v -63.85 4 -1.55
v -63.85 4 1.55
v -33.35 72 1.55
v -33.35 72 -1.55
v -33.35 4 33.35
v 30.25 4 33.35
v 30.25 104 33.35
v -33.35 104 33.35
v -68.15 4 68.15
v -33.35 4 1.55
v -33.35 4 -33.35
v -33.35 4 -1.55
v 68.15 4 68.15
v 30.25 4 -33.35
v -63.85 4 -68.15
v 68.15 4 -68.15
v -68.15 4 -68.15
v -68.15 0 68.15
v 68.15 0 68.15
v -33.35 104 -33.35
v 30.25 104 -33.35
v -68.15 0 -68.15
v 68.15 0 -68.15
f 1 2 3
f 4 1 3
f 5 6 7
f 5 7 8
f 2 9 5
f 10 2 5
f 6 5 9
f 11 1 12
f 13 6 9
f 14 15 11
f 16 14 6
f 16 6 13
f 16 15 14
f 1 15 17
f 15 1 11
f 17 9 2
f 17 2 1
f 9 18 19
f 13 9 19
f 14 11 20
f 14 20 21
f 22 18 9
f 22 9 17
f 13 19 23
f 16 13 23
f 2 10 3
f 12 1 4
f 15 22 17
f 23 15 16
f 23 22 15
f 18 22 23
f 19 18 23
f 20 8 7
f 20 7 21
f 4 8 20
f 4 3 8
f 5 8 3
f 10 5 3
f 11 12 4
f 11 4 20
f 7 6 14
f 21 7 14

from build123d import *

# Parameters (mm, degrees)
SKETCH_1_W          = 136.3
SKETCH_1_H          = 136.3
EXTRUDE_1_DEPTH     = 4
EXTRUDE_2_DEPTH     = 100
CUT_EXTRUDE_1_DEPTH = 100
SKETCH_4_W          = 60.5
SKETCH_4_H          = 100
EXTRUDE_3_DEPTH     = 60.5


with BuildPart() as part:
    # 草图1 → 凸台-拉伸1 (new body)
    with BuildSketch(Plane(origin=(0, 0, 0), x_dir=(1, 0, 0), z_dir=(0, 1, 0))):
        Rectangle(SKETCH_1_W, SKETCH_1_H)
    extrude(amount=EXTRUDE_1_DEPTH)

    # 草图2 → 凸台-拉伸2 (add)
    with BuildSketch(Plane(origin=(0, 4, 0), x_dir=(1, 0, 0), z_dir=(0, 1, 0))):
        Polygon((30.25, 30.25), (-30.25, 30.25), (-30.25, -30.25), (30.25, -30.25), (30.25, -33.35), (-33.35, -33.35), (-33.35, -1.55), (-63.85, -1.55), (-63.85, 1.55), (-33.35, 1.55), (-33.35, 33.35), (30.25, 33.35), align=None)
    extrude(amount=EXTRUDE_2_DEPTH)

    # 草图3 → 切除-拉伸1 (cut)
    with BuildSketch(Plane.XY.offset(1.55)):
        Polygon((-63.85, 4), (-33.35, 72), (-33.35, 104), (-63.85, 104), align=None)
    extrude(amount=-CUT_EXTRUDE_1_DEPTH, mode=Mode.SUBTRACT)

    # 草图4 → 凸台-拉伸3 (add)
    with BuildSketch(Plane(origin=(-30.25, 0, 0), x_dir=(0, 0, -1), z_dir=(1, 0, 0))):
        with Locations((0, 54)):
            Rectangle(SKETCH_4_W, SKETCH_4_H)
    extrude(amount=EXTRUDE_3_DEPTH)


solid = part.part
